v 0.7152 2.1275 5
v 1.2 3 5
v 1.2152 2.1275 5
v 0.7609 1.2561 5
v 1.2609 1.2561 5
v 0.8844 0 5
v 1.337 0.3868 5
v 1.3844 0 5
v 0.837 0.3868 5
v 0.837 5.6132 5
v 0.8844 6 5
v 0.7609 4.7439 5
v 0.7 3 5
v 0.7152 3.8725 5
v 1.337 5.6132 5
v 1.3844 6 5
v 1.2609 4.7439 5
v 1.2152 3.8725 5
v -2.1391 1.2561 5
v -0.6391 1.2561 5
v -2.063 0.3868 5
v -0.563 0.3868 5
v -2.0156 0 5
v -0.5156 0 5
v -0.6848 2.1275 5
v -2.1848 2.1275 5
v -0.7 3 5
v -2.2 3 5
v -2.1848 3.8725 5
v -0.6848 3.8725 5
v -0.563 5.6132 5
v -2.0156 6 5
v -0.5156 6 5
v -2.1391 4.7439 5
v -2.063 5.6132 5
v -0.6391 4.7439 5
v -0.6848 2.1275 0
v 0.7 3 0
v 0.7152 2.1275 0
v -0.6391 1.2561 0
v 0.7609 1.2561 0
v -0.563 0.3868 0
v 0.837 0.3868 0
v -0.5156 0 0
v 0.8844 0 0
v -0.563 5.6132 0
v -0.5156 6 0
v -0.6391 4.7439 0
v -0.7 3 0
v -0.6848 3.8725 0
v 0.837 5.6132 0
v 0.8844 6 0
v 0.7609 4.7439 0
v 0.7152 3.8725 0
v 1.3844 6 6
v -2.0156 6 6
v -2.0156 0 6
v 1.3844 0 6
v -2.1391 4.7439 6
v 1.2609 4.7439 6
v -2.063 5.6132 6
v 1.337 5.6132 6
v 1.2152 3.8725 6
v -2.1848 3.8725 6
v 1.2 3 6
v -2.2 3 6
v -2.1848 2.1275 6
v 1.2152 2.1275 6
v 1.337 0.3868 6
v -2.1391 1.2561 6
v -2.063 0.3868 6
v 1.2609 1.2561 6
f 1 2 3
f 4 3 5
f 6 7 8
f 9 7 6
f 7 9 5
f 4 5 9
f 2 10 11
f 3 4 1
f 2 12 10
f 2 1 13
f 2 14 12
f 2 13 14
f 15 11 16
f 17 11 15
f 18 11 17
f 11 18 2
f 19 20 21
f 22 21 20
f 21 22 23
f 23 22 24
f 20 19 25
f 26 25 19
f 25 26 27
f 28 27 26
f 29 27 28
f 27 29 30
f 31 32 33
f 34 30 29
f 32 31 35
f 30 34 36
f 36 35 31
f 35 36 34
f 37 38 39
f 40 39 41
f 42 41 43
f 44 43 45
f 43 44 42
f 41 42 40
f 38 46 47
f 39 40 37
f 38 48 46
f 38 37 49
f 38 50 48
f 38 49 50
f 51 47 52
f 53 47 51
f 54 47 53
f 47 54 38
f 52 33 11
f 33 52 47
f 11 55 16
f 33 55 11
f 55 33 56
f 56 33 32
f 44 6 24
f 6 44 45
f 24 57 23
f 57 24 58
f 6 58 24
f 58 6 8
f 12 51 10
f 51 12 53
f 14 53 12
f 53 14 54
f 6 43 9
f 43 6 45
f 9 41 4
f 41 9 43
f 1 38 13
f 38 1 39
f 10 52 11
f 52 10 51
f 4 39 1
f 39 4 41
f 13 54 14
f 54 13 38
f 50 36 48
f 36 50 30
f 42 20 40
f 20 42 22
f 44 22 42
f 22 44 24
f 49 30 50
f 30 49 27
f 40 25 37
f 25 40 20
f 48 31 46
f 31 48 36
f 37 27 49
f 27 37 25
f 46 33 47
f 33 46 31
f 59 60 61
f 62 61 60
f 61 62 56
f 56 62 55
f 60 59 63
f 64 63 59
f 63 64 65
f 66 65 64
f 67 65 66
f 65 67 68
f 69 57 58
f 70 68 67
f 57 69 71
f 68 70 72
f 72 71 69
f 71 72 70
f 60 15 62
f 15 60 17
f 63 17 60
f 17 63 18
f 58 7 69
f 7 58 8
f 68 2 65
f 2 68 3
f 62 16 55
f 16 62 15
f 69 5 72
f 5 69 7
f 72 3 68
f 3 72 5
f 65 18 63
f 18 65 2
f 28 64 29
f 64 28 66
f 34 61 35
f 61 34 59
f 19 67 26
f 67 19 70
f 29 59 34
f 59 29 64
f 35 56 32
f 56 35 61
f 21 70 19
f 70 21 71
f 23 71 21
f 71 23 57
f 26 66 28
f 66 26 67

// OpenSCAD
$fa = 2;
$fs = 0.25;

width = 6;

radius = 25;
thickness = 0.7;
depth = 5;
ledge_heigth = 1;
ledge_left = 0.5;
ledge_right = 1.5;

intersection() {
   difference() {
      translate([-5, 0, 0]) {
         cube(size = [10, width, depth]);
      }
                
      translate([radius + thickness, width/2, 0]) {
        cylinder(h = depth, r1 = radius, r2 = radius);
      }
   }
   
   translate([radius - thickness, width/2, 0]) {
    cylinder(h = depth, r1 = radius, r2 = radius);
  }
}

translate([0, 0, depth]) {
  intersection() {
   difference() {
      translate([-5, 0, 0]) {
         difference() {
           cube(size = [10, width, ledge_heigth]);
         }
      }
                
      translate([radius + thickness + ledge_left, width/2, 0]) {
        cylinder(h = ledge_heigth, r1 = radius, r2 = radius);
      }
    }
   
    translate([radius - thickness - ledge_right, width/2, 0]) {
      cylinder(h = ledge_heigth, r1 = radius, r2 = radius);
    }
  }
}
